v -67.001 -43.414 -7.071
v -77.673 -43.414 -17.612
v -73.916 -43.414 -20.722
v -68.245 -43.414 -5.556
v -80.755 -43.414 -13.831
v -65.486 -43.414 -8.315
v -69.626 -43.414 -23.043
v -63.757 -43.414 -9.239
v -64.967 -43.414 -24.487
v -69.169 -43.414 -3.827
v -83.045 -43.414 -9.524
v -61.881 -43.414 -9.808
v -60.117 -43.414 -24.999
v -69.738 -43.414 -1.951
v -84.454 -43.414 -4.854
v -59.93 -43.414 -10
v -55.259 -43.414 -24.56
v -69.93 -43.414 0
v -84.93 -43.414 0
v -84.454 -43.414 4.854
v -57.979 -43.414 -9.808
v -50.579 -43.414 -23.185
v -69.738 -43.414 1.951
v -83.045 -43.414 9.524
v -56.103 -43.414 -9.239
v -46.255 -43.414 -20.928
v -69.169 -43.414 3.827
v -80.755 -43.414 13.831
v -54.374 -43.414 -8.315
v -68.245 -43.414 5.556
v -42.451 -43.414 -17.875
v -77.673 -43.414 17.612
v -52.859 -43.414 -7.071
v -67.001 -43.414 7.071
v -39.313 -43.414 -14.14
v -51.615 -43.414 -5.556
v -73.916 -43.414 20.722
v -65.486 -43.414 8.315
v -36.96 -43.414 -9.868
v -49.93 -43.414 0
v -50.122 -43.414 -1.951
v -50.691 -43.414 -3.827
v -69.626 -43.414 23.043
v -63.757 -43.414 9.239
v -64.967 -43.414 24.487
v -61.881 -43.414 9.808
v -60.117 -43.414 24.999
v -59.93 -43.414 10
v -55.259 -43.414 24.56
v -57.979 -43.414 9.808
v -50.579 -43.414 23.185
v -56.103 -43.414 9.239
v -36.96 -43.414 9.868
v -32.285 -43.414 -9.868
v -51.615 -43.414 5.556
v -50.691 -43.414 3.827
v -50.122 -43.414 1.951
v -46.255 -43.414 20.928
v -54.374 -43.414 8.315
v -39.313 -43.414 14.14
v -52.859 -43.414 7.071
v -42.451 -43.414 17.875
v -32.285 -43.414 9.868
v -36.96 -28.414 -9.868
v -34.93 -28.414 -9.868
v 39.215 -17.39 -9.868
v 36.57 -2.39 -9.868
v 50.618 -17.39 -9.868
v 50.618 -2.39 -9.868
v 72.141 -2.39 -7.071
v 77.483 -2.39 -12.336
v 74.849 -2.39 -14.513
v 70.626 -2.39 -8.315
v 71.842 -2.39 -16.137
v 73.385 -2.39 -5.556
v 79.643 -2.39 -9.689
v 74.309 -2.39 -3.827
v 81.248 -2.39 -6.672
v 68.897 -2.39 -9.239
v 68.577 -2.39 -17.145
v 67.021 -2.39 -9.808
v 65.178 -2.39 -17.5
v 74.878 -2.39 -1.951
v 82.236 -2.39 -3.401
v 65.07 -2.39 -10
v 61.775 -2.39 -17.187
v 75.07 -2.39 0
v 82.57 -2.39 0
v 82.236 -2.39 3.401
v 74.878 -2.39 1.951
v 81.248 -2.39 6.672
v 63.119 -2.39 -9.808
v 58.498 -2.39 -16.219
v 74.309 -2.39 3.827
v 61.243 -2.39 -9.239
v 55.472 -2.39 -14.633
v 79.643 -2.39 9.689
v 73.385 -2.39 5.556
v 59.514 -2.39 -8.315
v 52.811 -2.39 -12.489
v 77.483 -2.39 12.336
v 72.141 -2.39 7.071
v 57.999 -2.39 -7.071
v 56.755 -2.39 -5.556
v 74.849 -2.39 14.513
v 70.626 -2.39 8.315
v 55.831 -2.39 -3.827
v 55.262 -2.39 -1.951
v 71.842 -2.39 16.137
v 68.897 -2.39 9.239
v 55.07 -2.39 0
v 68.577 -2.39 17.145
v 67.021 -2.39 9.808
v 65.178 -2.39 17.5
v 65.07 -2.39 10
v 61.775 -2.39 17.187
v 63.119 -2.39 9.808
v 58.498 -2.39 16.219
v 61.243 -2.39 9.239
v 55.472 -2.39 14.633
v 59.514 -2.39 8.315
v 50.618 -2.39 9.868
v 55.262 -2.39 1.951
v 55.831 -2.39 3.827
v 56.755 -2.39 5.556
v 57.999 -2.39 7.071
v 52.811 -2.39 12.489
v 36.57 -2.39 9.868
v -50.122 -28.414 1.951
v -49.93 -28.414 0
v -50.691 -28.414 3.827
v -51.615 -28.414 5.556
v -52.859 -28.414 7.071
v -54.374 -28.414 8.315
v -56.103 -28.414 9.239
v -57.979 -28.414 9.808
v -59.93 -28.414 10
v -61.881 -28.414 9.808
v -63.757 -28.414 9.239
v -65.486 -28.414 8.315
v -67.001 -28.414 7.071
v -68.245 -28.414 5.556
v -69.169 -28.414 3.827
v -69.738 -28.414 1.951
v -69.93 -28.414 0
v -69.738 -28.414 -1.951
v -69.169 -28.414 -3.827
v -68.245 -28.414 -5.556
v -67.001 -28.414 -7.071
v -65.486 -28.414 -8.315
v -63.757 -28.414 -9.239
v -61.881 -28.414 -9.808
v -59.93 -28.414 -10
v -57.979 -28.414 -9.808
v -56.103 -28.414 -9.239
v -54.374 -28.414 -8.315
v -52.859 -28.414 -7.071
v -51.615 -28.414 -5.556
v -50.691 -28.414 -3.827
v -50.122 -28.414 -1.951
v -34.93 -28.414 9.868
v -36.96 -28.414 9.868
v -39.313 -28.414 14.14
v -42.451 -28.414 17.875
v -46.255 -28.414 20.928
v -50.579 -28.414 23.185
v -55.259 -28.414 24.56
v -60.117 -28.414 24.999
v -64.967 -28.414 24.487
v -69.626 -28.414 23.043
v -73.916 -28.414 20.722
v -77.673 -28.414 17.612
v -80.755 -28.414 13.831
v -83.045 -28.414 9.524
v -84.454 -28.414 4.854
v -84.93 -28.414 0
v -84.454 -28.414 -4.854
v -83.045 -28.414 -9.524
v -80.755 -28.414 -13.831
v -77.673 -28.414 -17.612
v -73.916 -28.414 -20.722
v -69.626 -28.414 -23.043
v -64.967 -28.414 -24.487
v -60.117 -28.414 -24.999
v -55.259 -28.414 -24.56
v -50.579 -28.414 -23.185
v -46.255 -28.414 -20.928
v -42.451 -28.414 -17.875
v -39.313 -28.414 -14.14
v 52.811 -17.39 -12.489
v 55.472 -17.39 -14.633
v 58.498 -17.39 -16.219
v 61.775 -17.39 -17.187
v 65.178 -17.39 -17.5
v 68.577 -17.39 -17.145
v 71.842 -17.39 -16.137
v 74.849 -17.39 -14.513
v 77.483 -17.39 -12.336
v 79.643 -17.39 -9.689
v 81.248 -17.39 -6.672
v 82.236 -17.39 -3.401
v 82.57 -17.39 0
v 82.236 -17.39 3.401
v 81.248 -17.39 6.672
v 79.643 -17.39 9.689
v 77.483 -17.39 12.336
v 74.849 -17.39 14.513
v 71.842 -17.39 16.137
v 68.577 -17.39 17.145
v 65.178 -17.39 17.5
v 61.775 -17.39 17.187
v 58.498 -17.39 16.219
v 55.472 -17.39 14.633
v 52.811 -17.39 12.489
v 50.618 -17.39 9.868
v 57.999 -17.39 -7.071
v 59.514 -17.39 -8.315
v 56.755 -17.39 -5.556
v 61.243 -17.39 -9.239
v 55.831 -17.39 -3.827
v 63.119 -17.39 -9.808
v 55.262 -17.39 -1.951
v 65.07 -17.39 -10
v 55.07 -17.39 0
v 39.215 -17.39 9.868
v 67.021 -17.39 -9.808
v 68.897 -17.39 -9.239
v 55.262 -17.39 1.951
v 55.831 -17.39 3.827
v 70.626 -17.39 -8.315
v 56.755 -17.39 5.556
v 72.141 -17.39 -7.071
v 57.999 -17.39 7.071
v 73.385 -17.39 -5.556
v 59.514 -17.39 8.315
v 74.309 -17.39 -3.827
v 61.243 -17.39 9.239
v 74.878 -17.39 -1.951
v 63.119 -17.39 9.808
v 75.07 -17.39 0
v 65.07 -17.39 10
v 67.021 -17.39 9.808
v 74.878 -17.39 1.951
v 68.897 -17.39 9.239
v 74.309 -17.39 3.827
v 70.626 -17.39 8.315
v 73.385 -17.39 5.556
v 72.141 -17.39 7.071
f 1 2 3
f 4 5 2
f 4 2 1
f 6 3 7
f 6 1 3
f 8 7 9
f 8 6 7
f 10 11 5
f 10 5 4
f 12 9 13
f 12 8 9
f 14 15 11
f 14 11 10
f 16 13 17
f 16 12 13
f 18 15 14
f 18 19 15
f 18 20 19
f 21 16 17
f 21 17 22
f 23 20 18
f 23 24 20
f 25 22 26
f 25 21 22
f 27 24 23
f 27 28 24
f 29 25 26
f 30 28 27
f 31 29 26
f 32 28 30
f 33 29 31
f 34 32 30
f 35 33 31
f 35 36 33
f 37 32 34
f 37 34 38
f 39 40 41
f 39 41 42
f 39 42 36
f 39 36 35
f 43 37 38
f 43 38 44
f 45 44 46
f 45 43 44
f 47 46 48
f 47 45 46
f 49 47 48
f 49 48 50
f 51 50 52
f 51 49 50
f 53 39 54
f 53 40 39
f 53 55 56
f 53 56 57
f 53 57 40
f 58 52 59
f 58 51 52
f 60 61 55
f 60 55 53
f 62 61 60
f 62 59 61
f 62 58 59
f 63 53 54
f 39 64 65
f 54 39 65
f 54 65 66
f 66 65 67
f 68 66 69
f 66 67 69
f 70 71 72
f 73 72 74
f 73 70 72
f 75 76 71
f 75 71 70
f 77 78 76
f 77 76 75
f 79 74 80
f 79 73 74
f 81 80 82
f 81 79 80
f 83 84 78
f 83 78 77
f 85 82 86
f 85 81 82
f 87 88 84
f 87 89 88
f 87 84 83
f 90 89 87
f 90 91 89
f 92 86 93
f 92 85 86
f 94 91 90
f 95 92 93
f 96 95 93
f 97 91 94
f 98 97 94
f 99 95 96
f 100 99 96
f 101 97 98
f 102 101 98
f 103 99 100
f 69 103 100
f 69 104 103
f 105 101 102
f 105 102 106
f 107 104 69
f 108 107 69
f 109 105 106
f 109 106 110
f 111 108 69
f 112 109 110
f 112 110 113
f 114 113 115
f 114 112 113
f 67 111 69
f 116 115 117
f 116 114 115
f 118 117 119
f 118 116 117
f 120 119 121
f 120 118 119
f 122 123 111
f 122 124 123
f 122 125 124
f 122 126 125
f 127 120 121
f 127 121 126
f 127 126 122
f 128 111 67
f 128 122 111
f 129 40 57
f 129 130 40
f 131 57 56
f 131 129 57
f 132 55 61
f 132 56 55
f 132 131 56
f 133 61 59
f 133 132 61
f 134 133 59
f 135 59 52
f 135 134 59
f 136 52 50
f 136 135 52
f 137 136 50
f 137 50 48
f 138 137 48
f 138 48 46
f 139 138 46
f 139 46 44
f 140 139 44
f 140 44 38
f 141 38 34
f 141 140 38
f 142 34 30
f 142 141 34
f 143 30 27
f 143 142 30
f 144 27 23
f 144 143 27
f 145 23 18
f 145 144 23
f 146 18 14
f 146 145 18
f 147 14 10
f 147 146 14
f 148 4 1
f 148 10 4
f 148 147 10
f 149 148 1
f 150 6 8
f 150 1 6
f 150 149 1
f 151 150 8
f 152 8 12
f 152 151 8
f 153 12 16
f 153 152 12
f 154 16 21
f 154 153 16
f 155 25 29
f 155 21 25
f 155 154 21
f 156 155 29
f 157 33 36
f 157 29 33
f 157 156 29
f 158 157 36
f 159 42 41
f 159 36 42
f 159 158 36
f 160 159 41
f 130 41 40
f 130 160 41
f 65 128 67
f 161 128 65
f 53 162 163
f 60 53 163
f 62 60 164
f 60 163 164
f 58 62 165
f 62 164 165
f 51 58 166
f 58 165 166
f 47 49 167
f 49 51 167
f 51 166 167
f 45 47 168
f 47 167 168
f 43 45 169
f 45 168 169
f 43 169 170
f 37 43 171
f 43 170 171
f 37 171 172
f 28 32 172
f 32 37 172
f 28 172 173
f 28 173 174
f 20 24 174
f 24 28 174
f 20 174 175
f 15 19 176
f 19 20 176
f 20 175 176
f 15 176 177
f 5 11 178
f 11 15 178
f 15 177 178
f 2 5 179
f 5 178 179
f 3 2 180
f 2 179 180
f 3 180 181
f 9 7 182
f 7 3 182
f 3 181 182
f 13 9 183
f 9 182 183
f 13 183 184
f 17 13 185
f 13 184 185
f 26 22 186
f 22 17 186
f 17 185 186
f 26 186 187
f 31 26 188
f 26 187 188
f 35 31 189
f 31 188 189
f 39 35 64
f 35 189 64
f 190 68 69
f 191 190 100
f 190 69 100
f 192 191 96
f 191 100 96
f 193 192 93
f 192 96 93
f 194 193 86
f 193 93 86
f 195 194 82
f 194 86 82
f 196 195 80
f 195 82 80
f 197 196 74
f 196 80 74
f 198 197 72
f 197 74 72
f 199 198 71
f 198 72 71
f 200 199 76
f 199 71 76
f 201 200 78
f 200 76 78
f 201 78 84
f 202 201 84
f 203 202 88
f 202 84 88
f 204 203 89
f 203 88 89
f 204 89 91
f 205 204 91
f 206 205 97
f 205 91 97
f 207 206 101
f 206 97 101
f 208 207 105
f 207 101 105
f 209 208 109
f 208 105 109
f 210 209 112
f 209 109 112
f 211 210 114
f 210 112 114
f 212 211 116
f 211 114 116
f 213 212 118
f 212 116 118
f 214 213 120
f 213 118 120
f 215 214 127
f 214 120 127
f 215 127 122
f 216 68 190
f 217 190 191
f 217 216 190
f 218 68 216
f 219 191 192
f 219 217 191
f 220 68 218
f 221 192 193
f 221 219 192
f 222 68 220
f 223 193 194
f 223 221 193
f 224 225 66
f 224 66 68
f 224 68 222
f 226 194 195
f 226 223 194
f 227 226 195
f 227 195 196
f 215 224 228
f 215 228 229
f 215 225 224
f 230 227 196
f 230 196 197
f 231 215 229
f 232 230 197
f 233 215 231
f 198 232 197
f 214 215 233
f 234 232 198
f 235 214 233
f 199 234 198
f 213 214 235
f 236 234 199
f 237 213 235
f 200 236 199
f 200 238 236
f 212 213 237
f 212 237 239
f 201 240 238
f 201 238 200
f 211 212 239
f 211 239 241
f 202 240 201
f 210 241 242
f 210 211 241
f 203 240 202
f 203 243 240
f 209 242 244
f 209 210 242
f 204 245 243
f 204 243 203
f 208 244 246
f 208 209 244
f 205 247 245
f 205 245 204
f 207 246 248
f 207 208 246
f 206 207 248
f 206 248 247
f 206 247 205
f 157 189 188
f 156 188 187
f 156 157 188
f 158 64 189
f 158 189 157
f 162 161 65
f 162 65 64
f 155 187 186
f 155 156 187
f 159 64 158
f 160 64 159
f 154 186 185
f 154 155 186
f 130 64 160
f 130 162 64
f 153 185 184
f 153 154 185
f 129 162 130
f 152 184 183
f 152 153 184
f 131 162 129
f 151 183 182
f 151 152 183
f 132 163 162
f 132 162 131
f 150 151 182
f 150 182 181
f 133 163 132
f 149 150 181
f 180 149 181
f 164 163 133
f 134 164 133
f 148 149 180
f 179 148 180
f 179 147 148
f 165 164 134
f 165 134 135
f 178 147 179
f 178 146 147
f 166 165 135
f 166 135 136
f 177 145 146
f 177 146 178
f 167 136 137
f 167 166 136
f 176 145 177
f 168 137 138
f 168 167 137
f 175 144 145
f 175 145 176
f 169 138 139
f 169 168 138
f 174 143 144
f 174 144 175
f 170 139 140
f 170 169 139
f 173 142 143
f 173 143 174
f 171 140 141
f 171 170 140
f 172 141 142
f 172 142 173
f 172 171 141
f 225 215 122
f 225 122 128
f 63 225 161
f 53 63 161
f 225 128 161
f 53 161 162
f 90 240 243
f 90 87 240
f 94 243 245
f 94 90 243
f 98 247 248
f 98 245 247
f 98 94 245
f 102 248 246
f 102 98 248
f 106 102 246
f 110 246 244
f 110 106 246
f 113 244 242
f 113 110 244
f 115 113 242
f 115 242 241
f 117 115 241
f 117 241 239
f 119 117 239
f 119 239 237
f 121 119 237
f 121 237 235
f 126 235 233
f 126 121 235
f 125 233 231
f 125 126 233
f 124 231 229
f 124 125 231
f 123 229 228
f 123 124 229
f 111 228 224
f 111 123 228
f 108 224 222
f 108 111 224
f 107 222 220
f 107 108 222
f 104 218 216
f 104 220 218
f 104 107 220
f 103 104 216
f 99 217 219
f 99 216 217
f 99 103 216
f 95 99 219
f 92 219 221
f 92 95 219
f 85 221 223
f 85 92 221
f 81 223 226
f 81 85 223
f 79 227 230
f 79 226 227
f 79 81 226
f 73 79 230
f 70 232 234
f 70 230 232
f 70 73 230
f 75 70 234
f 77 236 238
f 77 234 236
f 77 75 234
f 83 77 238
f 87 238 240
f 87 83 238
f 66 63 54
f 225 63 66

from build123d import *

# Parameters (mm, degrees)
F0_R     = 10
F1_DEPTH = 25
F2_DEPTH = 25
F4_DEPTH = 35


with BuildPart() as f1:
    # F0 (on Front) → F1 (new body)
    with BuildSketch(Plane.XZ):
        with BuildLine():
            ThreePointArc((-36.9599174113, -9.8680967563), (-35.4426720485, -5.0373667286), (-34.9299123266, 0))
            ThreePointArc((-34.9299123266, 0), (-35.4426720485, 5.0373667286), (-36.9599174113, 9.8680967563))
            ThreePointArc((-36.9599174113, 9.8680967563), (-84.9299123266, 0), (-36.9599174113, -9.8680967563))
        make_face()
        with Locations((-59.9299123266, 0)):
            Circle(F0_R, mode=Mode.SUBTRACT)
        with BuildLine():
            ThreePointArc((-36.9599174113, 9.8680967563), (-35.4426720485, 5.0373667286), (-34.9299123266, 0))
            ThreePointArc((-34.9299123266, 0), (-35.4426720485, -5.0373667286), (-36.9599174113, -9.8680967563))
            Line((-36.9599174113, -9.8680967563), (50.6177291666, -9.8680967563))
            ThreePointArc((50.6177291666, -9.8680967563), (47.5700876734, 0), (50.6177291666, 9.8680967563))
            Line((50.6177291666, 9.8680967563), (-36.9599174113, 9.8680967563))
        make_face()
        with BuildLine():
            ThreePointArc((82.5700876734, 0), (70.2340844845, 16.7207397245), (50.6177291666, 9.8680967563))
            ThreePointArc((50.6177291666, 9.8680967563), (47.5700876734, 0), (50.6177291666, -9.8680967563))
            ThreePointArc((50.6177291666, -9.8680967563), (70.2340844845, -16.7207397245), (82.5700876734, 0))
        make_face()
        with Locations((65.0700876734, 0)):
            Circle(F0_R, mode=Mode.SUBTRACT)
    extrude(amount=F1_DEPTH)

    # F2 (add): a face of the model
    f2_faces = [f1.faces().sort_by_distance(p)[0] for p in [
        (-11.6027124374, -25, 0),
    ]]
    extrude(f2_faces, amount=F2_DEPTH)

    # F3 (on Top) → F4 (intersect, symmetric)
    with BuildSketch(Plane.XY):
        Polygon((82.5700876734, -17.3896358903), (82.5700876734, -2.3896358903), (36.5700876734, -2.3896358903), (-34.9299123266, -28.4135076404), (-84.9299123266, -28.4135076404), (-84.9299123266, -43.4135076404), (-32.285007616, -43.4135076404), (39.214992384, -17.3896358903), align=None)
    extrude(amount=F4_DEPTH, both=True, mode=Mode.INTERSECT)


solid = f1.part
